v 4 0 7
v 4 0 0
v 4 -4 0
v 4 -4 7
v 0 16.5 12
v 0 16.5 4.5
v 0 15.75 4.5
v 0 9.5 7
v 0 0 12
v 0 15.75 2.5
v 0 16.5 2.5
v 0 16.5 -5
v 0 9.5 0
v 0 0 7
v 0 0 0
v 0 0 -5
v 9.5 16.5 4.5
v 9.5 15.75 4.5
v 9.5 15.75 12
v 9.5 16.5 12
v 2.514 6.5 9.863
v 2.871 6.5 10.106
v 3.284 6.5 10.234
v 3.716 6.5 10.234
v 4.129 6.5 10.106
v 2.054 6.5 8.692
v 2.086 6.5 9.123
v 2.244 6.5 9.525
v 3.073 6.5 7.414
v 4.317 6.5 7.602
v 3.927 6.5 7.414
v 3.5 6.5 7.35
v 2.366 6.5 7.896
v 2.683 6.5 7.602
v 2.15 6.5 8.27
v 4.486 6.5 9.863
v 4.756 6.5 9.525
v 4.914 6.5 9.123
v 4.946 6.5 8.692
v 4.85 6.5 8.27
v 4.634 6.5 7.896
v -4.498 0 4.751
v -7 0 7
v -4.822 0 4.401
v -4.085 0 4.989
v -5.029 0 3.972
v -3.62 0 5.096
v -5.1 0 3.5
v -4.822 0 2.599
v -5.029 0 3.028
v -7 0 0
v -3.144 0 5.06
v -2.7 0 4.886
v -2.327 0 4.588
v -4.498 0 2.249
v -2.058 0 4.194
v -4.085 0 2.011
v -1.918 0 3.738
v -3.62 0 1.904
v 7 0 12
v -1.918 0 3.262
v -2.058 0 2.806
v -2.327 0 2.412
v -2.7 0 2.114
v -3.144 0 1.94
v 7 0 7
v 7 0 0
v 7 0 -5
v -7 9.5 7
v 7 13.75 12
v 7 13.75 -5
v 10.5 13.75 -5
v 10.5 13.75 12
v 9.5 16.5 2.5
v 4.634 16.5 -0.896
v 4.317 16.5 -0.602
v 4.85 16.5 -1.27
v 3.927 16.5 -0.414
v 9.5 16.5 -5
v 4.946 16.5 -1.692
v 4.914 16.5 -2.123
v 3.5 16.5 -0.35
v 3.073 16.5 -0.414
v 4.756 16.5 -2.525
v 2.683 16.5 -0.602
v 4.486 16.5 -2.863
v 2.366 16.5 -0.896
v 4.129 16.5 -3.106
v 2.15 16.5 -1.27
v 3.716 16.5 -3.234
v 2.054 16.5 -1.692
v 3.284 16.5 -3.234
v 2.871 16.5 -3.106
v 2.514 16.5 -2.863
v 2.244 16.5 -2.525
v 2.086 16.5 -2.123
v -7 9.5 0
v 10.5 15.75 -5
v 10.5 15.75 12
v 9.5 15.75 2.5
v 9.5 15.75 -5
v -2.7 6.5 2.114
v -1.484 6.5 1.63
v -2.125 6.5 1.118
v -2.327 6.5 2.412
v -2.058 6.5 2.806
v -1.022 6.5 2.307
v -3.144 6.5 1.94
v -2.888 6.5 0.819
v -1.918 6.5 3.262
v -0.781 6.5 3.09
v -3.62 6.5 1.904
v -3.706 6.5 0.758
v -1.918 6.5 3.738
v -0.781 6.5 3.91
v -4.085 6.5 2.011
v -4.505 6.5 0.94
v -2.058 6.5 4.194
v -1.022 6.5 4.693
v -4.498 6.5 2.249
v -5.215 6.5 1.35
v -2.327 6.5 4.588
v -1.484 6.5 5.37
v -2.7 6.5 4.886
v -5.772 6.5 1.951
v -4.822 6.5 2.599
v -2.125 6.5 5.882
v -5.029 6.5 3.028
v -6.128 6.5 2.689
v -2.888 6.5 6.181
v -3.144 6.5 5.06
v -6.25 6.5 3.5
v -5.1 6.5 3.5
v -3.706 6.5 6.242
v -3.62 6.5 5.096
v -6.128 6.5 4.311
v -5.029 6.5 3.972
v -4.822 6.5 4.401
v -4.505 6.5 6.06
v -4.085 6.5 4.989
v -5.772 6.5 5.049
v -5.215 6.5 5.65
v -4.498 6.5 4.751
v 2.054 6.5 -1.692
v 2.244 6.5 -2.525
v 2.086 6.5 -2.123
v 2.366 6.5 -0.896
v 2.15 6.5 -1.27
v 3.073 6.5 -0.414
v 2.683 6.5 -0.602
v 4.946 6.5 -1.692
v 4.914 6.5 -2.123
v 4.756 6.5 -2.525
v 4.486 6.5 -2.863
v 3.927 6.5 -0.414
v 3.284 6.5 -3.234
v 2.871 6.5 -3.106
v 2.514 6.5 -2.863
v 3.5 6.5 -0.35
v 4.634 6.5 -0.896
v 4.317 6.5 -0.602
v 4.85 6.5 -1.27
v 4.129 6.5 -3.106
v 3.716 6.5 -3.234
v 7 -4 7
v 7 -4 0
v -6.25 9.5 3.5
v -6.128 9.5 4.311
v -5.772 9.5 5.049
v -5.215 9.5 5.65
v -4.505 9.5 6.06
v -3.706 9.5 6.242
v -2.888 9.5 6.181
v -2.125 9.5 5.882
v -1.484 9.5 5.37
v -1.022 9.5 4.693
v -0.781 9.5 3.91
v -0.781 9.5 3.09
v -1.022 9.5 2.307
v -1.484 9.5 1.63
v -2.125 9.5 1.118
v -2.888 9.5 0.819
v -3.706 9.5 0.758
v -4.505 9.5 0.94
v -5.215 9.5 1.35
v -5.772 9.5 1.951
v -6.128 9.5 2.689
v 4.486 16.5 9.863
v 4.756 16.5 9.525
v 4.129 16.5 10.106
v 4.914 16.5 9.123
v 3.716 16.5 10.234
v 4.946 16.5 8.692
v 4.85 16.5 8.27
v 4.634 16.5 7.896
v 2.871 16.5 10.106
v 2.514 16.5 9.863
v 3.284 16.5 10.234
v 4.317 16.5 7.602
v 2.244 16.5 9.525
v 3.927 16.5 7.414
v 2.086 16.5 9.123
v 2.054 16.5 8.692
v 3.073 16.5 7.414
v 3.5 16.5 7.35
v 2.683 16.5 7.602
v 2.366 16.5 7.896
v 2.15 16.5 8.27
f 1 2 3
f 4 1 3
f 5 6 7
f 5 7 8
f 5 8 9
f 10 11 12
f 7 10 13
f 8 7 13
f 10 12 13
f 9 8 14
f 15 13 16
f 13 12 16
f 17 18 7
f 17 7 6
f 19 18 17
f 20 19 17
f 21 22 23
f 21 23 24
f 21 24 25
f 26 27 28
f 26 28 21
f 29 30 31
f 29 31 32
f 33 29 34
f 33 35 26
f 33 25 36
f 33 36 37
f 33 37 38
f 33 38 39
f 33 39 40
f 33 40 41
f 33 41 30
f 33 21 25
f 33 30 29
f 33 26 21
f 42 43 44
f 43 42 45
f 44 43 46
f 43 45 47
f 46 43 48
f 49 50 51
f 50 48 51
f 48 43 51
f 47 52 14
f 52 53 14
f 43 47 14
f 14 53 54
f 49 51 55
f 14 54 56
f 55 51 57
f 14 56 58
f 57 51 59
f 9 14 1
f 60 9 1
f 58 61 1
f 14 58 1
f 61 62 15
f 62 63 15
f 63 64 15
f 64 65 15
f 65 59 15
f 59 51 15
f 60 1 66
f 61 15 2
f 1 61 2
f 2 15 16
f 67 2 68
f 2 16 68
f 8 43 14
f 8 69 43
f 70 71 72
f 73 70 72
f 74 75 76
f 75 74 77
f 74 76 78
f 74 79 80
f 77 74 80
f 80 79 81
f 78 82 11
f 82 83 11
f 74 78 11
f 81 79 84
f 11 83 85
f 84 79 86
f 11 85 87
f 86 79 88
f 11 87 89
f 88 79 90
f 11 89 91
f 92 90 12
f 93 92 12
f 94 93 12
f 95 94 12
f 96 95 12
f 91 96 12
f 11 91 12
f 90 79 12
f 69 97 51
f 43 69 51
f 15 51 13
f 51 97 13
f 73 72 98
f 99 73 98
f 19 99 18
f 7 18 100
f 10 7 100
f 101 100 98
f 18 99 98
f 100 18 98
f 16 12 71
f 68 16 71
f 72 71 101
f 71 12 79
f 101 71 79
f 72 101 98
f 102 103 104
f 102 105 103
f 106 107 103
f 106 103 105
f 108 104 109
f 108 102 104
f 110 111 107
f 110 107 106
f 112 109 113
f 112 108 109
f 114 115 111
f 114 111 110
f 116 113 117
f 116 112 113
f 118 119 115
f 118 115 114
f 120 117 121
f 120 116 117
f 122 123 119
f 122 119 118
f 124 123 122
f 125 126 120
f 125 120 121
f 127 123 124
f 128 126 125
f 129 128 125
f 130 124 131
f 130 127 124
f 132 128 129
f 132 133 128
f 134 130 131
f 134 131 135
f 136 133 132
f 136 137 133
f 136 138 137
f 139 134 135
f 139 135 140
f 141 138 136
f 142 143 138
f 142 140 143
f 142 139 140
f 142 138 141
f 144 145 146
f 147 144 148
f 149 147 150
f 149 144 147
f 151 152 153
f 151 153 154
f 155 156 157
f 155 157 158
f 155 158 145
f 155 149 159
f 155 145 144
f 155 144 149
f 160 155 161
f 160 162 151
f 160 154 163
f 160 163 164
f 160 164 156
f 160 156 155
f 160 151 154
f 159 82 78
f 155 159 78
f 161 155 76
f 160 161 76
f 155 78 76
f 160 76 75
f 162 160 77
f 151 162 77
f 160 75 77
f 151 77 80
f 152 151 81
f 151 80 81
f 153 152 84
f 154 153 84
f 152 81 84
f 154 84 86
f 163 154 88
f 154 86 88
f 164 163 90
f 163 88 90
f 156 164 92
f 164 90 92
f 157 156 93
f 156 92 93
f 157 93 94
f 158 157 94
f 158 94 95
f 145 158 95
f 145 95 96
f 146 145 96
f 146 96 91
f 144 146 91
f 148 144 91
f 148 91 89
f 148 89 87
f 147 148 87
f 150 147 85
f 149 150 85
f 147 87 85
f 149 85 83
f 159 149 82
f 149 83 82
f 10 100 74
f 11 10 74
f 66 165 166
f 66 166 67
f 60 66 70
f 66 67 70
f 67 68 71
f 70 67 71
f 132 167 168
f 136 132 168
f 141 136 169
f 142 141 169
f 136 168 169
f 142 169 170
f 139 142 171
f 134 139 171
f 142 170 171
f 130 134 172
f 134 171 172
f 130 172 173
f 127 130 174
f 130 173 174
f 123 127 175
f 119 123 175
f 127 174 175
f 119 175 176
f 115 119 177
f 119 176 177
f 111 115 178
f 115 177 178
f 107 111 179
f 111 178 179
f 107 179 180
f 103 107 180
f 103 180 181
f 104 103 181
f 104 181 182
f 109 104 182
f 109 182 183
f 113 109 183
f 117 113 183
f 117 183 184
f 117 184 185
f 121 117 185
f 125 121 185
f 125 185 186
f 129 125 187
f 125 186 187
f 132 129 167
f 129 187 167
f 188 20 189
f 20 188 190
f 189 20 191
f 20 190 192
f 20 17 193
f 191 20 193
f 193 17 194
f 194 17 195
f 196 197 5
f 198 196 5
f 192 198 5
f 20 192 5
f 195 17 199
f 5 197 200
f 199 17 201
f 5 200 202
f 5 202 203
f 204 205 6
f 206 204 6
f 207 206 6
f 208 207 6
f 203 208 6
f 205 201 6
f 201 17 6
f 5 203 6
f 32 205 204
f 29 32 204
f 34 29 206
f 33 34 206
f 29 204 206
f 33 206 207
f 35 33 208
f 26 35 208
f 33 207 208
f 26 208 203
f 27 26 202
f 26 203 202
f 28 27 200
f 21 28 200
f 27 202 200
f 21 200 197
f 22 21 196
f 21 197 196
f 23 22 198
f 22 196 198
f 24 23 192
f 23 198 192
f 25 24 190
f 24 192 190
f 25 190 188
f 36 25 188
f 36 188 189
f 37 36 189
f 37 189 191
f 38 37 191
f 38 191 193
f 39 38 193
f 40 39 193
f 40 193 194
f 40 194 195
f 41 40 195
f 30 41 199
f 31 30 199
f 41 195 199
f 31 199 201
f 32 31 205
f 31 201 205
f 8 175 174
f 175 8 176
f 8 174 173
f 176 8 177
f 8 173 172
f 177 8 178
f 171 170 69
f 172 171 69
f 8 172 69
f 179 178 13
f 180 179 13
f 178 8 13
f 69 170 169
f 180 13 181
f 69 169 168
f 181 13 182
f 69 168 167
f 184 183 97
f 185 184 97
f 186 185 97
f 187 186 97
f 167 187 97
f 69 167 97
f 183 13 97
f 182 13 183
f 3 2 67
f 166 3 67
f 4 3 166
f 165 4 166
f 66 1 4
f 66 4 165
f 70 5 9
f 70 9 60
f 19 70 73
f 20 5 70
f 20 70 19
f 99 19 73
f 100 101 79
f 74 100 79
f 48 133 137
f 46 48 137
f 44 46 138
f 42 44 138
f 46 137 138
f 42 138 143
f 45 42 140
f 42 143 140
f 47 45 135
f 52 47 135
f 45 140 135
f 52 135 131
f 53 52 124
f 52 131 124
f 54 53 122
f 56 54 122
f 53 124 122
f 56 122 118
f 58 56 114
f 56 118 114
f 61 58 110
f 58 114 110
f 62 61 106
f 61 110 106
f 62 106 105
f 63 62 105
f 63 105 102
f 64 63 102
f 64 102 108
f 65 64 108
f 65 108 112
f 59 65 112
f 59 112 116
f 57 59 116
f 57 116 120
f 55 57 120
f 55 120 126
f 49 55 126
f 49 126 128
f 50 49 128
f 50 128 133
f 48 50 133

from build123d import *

# Parameters (mm, degrees)
SALIENTE_EXTRUIR1_DEPTH      = 7
CROQUIS5_R                   = 1.6
CORTAR_EXTRUIR2_DEPTH        = 13.9
CROQUIS6_R                   = 2.75
CORTAR_EXTRUIR3_DEPTH        = 3
SALIENTE_EXTRUIR2_DEPTH      = 5
SALIENTE_EXTRUIR2_DEPTH_BACK = 12
CROQUIS8_R                   = 1.45
CORTAR_EXTRUIR4_DEPTH        = 10
CROQUIS9_W                   = 2
CROQUIS9_H                   = 0.75
CORTAR_EXTRUIR5_DEPTH        = 10


with BuildPart() as part:
    # Croquis1 → Saliente-Extruir1 (new body)
    with BuildSketch(Plane.XY):
        Polygon((0, 0), (4, 0), (4, -4), (7, -4), (7, 0), (7, 13.75), (10.5, 13.75), (10.5, 15.75), (9.5, 15.75), (9.5, 16.5), (7, 16.5), (0, 16.5), (0, 9.5), (-7, 9.5), (-7, 0), align=None)
    extrude(amount=SALIENTE_EXTRUIR1_DEPTH)

    # Croquis5 → Cortar-Extruir2 (cut)
    with BuildSketch(Plane(origin=(0, 9.5, 0), x_dir=(1, 0, 0), z_dir=(0, 1, 0))):
        with Locations(Location((-3.5, -3.5, 0), (0, 0, 180))):
            Circle(CROQUIS5_R)
    extrude(amount=-CORTAR_EXTRUIR2_DEPTH, mode=Mode.SUBTRACT)

    # Croquis6 → Cortar-Extruir3 (cut)
    with BuildSketch(Plane(origin=(0, 9.5, 0), x_dir=(1, 0, 0), z_dir=(0, 1, 0))):
        with Locations(Location((-3.5, -3.5, 0), (0, 0, 180))):
            Circle(CROQUIS6_R)
    extrude(amount=-CORTAR_EXTRUIR3_DEPTH, mode=Mode.SUBTRACT)

    # Croquis7 → Saliente-Extruir2 (add, two sides: drawn at the far end of the back side and taken through both)
    with BuildSketch(Plane.XY.offset(7).offset(-SALIENTE_EXTRUIR2_DEPTH_BACK)):
        Polygon((0, 16.5), (0, 0), (7, 0), (7, 13.75), (10.5, 13.75), (10.5, 15.75), (9.5, 15.75), (9.5, 16.5), align=None)
    extrude(amount=SALIENTE_EXTRUIR2_DEPTH + SALIENTE_EXTRUIR2_DEPTH_BACK)

    # Croquis8 → Cortar-Extruir4 (cut)
    with BuildSketch(Plane(origin=(0, 16.5, 0), x_dir=(1, 0, 0), z_dir=(0, 1, 0))):
        with Locations(Location((3.5, 1.8, 0), (0, 0, 270))):
            Circle(CROQUIS8_R)
        with Locations(Location((3.5, -8.8, 0), (0, 0, 90))):
            Circle(CROQUIS8_R)
    extrude(amount=-CORTAR_EXTRUIR4_DEPTH, mode=Mode.SUBTRACT)

    # Croquis9 → Cortar-Extruir5 (cut)
    with BuildSketch(Plane(origin=(9.5, 0, 0), x_dir=(0, 0, -1), z_dir=(1, 0, 0))):
        with Locations((-3.5, 16.125)):
            Rectangle(CROQUIS9_W, CROQUIS9_H)
    extrude(amount=-CORTAR_EXTRUIR5_DEPTH, mode=Mode.SUBTRACT)


solid = part.part
